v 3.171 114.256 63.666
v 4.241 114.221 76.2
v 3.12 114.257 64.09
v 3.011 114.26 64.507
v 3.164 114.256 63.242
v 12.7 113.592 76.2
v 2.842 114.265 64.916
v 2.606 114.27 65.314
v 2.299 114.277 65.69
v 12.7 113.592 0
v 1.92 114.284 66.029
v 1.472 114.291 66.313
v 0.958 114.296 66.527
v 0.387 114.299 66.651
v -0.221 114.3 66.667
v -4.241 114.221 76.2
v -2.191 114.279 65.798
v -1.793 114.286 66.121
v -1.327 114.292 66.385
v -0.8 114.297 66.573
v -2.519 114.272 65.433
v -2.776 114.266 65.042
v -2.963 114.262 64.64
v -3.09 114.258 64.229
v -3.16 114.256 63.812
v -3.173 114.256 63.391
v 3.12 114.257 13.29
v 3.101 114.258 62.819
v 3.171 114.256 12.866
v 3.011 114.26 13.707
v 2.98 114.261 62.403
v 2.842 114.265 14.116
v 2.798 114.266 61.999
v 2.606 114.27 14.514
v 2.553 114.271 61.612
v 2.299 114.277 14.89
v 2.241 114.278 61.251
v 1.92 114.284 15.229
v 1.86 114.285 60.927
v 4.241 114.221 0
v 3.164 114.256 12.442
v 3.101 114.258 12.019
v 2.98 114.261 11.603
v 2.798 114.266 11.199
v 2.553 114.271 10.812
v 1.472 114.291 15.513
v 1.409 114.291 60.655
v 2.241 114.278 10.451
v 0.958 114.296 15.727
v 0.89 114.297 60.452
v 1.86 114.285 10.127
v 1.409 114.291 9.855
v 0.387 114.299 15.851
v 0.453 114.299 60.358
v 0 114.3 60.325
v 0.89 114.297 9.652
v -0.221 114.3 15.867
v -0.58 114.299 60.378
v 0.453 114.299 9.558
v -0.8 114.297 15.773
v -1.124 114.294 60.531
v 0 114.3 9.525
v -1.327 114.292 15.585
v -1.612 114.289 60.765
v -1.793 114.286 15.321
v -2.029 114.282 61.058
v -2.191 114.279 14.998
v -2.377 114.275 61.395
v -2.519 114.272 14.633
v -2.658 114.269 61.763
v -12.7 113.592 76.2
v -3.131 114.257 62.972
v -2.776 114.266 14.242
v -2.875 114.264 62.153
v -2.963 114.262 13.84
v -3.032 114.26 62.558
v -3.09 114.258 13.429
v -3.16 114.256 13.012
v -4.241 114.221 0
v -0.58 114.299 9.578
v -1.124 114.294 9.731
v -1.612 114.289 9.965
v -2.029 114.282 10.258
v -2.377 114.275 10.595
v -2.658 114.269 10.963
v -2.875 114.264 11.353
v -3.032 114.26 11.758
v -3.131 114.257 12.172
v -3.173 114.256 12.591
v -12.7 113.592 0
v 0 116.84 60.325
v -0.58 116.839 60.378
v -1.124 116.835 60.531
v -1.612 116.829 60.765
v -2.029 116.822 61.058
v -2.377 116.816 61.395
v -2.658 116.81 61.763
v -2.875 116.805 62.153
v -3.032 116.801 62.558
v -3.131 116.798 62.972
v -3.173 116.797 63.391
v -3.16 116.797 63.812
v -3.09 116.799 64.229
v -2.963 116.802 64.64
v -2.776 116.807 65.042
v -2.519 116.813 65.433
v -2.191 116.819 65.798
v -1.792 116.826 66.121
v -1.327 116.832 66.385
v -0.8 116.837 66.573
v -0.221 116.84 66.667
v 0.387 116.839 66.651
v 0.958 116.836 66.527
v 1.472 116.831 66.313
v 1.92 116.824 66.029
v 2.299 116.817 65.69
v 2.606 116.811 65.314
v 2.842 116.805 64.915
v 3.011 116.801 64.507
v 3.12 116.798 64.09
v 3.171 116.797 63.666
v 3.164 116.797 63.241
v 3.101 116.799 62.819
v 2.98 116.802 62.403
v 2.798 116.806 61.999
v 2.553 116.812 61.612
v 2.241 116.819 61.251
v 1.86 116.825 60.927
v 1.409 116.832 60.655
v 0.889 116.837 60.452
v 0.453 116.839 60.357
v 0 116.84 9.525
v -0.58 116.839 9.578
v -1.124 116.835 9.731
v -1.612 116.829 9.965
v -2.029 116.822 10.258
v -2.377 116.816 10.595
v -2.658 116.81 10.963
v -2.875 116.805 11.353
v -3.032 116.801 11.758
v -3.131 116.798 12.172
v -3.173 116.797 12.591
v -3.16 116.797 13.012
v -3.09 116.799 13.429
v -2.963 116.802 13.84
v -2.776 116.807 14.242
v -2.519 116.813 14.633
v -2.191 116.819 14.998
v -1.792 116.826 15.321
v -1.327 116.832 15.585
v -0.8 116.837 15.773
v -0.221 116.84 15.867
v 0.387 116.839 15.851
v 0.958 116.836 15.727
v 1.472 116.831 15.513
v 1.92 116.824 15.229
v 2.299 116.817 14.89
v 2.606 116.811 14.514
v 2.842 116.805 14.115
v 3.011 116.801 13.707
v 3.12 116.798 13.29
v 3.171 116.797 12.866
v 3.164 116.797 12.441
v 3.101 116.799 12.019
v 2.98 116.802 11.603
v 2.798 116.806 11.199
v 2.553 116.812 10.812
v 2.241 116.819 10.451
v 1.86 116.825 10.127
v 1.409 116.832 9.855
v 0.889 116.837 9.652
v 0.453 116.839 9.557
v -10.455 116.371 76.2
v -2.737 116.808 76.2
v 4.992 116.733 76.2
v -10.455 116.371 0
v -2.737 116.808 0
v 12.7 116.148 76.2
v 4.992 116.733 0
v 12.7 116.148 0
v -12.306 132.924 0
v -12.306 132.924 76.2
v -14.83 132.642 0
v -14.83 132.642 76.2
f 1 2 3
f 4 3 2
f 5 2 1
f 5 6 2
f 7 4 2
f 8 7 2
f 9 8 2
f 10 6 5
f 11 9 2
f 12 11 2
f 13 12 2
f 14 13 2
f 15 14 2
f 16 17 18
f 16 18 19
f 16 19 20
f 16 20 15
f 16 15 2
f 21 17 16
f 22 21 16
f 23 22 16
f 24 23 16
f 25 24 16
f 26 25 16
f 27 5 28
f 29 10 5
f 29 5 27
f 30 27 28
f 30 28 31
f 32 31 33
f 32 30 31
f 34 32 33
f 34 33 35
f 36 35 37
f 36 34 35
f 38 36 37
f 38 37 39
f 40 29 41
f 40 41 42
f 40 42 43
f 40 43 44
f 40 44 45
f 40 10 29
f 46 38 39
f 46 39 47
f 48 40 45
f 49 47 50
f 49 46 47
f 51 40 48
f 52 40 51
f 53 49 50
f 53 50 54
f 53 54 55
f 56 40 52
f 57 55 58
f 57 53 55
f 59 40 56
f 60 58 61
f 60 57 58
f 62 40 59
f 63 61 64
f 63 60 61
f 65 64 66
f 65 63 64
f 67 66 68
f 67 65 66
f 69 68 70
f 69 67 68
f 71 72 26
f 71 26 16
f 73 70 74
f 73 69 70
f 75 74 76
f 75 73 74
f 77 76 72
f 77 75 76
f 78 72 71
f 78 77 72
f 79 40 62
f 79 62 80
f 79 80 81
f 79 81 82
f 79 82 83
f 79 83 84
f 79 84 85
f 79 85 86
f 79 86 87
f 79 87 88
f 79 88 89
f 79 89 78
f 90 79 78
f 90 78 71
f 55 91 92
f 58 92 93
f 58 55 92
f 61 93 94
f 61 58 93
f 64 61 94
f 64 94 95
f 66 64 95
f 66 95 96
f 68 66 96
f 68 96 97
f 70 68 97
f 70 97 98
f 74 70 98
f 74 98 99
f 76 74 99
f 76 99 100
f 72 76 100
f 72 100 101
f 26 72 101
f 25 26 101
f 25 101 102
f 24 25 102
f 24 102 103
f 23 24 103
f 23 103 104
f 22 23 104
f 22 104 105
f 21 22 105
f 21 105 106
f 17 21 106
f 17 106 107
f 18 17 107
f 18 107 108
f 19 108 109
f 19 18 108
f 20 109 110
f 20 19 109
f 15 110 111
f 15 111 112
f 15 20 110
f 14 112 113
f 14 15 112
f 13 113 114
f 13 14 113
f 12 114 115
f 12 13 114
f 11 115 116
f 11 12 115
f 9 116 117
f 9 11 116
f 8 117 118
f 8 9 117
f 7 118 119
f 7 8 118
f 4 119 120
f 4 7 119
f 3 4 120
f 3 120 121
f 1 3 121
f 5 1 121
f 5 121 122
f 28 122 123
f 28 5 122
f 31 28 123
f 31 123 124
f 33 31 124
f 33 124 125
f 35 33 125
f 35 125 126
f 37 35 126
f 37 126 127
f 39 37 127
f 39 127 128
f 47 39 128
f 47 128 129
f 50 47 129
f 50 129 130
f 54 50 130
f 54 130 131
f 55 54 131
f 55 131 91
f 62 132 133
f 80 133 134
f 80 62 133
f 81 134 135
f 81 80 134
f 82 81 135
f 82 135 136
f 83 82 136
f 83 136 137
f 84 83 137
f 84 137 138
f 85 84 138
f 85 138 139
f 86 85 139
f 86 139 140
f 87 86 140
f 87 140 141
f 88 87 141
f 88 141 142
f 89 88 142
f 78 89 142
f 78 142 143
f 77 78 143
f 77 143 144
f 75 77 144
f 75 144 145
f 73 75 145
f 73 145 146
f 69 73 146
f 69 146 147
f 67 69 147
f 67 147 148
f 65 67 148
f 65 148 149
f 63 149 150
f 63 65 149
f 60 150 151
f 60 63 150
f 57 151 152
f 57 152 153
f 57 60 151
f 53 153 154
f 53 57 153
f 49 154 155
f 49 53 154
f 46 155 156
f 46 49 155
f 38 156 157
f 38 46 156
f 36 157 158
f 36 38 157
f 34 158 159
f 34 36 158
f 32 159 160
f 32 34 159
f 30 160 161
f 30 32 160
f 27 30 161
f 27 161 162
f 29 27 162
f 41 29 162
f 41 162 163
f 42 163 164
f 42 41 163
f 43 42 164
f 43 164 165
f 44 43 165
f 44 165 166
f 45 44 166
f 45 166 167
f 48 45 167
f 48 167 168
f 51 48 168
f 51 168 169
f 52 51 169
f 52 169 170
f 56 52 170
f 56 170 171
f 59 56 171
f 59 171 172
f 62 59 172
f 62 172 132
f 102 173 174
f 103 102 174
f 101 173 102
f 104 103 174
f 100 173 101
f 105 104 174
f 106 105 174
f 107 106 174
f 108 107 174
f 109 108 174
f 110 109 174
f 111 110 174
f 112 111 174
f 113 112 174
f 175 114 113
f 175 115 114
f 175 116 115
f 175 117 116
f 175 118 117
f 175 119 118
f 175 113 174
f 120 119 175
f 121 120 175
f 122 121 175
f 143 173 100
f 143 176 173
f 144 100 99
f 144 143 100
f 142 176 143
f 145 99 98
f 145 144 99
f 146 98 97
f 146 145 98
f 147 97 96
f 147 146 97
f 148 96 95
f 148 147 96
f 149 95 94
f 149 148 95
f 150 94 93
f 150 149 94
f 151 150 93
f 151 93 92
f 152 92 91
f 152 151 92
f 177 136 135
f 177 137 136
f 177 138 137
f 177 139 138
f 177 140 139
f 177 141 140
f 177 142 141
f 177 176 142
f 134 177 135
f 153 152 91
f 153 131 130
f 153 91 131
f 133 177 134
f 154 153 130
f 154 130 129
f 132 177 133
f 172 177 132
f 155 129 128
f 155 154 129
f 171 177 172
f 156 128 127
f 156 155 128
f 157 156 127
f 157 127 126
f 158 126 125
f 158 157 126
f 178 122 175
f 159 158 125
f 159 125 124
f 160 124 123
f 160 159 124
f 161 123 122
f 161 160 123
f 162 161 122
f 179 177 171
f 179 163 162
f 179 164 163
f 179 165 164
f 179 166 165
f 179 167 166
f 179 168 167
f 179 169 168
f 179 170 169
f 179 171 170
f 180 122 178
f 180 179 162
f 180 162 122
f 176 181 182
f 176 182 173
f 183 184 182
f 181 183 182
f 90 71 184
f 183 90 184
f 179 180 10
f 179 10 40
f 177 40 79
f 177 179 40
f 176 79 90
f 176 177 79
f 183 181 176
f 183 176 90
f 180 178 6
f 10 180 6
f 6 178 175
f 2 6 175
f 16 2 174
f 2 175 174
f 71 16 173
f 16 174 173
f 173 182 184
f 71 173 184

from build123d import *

# Parameters (mm, degrees)
BOSS_EXTRUDE1_DEPTH = 76.2
SKETCH2_R           = 3.175
CUT_EXTRUDE1_DEPTH  = 154.932715085


with BuildPart() as part:
    # Sketch1 → Boss-Extrude1 (new body)
    with BuildSketch(Plane.XY):
        with BuildLine():
            Line((-12.7, 113.592253257), (-14.829854749, 132.642253257))
            Line((-14.829854749, 132.642253257), (-12.305582454, 132.924475479))
            Line((-12.305582454, 132.924475479), (-10.454881932, 116.371306789))
            ThreePointArc((-10.454881932, 116.371306789), (1.128111355, 116.834553813), (12.7, 116.14773179))
            Line((12.7, 116.14773179), (12.7, 113.592253257))
            ThreePointArc((12.7, 113.592253257), (0, 114.3), (-12.7, 113.592253257))
        make_face()
    extrude(amount=BOSS_EXTRUDE1_DEPTH)

    # Sketch2 → Cut-Extrude1 (cut, through all)
    with BuildSketch(Plane(origin=(0, 0, 0), x_dir=(1, 0, 0), z_dir=(0, 1, 0))):
        with Locations(Location((0, -12.7, 0), (0, 0, 90))):
            Circle(SKETCH2_R)
        with Locations(Location((0, -63.5, 0), (0, 0, 90))):
            Circle(SKETCH2_R)
    extrude(amount=CUT_EXTRUDE1_DEPTH, mode=Mode.SUBTRACT)


solid = part.part
